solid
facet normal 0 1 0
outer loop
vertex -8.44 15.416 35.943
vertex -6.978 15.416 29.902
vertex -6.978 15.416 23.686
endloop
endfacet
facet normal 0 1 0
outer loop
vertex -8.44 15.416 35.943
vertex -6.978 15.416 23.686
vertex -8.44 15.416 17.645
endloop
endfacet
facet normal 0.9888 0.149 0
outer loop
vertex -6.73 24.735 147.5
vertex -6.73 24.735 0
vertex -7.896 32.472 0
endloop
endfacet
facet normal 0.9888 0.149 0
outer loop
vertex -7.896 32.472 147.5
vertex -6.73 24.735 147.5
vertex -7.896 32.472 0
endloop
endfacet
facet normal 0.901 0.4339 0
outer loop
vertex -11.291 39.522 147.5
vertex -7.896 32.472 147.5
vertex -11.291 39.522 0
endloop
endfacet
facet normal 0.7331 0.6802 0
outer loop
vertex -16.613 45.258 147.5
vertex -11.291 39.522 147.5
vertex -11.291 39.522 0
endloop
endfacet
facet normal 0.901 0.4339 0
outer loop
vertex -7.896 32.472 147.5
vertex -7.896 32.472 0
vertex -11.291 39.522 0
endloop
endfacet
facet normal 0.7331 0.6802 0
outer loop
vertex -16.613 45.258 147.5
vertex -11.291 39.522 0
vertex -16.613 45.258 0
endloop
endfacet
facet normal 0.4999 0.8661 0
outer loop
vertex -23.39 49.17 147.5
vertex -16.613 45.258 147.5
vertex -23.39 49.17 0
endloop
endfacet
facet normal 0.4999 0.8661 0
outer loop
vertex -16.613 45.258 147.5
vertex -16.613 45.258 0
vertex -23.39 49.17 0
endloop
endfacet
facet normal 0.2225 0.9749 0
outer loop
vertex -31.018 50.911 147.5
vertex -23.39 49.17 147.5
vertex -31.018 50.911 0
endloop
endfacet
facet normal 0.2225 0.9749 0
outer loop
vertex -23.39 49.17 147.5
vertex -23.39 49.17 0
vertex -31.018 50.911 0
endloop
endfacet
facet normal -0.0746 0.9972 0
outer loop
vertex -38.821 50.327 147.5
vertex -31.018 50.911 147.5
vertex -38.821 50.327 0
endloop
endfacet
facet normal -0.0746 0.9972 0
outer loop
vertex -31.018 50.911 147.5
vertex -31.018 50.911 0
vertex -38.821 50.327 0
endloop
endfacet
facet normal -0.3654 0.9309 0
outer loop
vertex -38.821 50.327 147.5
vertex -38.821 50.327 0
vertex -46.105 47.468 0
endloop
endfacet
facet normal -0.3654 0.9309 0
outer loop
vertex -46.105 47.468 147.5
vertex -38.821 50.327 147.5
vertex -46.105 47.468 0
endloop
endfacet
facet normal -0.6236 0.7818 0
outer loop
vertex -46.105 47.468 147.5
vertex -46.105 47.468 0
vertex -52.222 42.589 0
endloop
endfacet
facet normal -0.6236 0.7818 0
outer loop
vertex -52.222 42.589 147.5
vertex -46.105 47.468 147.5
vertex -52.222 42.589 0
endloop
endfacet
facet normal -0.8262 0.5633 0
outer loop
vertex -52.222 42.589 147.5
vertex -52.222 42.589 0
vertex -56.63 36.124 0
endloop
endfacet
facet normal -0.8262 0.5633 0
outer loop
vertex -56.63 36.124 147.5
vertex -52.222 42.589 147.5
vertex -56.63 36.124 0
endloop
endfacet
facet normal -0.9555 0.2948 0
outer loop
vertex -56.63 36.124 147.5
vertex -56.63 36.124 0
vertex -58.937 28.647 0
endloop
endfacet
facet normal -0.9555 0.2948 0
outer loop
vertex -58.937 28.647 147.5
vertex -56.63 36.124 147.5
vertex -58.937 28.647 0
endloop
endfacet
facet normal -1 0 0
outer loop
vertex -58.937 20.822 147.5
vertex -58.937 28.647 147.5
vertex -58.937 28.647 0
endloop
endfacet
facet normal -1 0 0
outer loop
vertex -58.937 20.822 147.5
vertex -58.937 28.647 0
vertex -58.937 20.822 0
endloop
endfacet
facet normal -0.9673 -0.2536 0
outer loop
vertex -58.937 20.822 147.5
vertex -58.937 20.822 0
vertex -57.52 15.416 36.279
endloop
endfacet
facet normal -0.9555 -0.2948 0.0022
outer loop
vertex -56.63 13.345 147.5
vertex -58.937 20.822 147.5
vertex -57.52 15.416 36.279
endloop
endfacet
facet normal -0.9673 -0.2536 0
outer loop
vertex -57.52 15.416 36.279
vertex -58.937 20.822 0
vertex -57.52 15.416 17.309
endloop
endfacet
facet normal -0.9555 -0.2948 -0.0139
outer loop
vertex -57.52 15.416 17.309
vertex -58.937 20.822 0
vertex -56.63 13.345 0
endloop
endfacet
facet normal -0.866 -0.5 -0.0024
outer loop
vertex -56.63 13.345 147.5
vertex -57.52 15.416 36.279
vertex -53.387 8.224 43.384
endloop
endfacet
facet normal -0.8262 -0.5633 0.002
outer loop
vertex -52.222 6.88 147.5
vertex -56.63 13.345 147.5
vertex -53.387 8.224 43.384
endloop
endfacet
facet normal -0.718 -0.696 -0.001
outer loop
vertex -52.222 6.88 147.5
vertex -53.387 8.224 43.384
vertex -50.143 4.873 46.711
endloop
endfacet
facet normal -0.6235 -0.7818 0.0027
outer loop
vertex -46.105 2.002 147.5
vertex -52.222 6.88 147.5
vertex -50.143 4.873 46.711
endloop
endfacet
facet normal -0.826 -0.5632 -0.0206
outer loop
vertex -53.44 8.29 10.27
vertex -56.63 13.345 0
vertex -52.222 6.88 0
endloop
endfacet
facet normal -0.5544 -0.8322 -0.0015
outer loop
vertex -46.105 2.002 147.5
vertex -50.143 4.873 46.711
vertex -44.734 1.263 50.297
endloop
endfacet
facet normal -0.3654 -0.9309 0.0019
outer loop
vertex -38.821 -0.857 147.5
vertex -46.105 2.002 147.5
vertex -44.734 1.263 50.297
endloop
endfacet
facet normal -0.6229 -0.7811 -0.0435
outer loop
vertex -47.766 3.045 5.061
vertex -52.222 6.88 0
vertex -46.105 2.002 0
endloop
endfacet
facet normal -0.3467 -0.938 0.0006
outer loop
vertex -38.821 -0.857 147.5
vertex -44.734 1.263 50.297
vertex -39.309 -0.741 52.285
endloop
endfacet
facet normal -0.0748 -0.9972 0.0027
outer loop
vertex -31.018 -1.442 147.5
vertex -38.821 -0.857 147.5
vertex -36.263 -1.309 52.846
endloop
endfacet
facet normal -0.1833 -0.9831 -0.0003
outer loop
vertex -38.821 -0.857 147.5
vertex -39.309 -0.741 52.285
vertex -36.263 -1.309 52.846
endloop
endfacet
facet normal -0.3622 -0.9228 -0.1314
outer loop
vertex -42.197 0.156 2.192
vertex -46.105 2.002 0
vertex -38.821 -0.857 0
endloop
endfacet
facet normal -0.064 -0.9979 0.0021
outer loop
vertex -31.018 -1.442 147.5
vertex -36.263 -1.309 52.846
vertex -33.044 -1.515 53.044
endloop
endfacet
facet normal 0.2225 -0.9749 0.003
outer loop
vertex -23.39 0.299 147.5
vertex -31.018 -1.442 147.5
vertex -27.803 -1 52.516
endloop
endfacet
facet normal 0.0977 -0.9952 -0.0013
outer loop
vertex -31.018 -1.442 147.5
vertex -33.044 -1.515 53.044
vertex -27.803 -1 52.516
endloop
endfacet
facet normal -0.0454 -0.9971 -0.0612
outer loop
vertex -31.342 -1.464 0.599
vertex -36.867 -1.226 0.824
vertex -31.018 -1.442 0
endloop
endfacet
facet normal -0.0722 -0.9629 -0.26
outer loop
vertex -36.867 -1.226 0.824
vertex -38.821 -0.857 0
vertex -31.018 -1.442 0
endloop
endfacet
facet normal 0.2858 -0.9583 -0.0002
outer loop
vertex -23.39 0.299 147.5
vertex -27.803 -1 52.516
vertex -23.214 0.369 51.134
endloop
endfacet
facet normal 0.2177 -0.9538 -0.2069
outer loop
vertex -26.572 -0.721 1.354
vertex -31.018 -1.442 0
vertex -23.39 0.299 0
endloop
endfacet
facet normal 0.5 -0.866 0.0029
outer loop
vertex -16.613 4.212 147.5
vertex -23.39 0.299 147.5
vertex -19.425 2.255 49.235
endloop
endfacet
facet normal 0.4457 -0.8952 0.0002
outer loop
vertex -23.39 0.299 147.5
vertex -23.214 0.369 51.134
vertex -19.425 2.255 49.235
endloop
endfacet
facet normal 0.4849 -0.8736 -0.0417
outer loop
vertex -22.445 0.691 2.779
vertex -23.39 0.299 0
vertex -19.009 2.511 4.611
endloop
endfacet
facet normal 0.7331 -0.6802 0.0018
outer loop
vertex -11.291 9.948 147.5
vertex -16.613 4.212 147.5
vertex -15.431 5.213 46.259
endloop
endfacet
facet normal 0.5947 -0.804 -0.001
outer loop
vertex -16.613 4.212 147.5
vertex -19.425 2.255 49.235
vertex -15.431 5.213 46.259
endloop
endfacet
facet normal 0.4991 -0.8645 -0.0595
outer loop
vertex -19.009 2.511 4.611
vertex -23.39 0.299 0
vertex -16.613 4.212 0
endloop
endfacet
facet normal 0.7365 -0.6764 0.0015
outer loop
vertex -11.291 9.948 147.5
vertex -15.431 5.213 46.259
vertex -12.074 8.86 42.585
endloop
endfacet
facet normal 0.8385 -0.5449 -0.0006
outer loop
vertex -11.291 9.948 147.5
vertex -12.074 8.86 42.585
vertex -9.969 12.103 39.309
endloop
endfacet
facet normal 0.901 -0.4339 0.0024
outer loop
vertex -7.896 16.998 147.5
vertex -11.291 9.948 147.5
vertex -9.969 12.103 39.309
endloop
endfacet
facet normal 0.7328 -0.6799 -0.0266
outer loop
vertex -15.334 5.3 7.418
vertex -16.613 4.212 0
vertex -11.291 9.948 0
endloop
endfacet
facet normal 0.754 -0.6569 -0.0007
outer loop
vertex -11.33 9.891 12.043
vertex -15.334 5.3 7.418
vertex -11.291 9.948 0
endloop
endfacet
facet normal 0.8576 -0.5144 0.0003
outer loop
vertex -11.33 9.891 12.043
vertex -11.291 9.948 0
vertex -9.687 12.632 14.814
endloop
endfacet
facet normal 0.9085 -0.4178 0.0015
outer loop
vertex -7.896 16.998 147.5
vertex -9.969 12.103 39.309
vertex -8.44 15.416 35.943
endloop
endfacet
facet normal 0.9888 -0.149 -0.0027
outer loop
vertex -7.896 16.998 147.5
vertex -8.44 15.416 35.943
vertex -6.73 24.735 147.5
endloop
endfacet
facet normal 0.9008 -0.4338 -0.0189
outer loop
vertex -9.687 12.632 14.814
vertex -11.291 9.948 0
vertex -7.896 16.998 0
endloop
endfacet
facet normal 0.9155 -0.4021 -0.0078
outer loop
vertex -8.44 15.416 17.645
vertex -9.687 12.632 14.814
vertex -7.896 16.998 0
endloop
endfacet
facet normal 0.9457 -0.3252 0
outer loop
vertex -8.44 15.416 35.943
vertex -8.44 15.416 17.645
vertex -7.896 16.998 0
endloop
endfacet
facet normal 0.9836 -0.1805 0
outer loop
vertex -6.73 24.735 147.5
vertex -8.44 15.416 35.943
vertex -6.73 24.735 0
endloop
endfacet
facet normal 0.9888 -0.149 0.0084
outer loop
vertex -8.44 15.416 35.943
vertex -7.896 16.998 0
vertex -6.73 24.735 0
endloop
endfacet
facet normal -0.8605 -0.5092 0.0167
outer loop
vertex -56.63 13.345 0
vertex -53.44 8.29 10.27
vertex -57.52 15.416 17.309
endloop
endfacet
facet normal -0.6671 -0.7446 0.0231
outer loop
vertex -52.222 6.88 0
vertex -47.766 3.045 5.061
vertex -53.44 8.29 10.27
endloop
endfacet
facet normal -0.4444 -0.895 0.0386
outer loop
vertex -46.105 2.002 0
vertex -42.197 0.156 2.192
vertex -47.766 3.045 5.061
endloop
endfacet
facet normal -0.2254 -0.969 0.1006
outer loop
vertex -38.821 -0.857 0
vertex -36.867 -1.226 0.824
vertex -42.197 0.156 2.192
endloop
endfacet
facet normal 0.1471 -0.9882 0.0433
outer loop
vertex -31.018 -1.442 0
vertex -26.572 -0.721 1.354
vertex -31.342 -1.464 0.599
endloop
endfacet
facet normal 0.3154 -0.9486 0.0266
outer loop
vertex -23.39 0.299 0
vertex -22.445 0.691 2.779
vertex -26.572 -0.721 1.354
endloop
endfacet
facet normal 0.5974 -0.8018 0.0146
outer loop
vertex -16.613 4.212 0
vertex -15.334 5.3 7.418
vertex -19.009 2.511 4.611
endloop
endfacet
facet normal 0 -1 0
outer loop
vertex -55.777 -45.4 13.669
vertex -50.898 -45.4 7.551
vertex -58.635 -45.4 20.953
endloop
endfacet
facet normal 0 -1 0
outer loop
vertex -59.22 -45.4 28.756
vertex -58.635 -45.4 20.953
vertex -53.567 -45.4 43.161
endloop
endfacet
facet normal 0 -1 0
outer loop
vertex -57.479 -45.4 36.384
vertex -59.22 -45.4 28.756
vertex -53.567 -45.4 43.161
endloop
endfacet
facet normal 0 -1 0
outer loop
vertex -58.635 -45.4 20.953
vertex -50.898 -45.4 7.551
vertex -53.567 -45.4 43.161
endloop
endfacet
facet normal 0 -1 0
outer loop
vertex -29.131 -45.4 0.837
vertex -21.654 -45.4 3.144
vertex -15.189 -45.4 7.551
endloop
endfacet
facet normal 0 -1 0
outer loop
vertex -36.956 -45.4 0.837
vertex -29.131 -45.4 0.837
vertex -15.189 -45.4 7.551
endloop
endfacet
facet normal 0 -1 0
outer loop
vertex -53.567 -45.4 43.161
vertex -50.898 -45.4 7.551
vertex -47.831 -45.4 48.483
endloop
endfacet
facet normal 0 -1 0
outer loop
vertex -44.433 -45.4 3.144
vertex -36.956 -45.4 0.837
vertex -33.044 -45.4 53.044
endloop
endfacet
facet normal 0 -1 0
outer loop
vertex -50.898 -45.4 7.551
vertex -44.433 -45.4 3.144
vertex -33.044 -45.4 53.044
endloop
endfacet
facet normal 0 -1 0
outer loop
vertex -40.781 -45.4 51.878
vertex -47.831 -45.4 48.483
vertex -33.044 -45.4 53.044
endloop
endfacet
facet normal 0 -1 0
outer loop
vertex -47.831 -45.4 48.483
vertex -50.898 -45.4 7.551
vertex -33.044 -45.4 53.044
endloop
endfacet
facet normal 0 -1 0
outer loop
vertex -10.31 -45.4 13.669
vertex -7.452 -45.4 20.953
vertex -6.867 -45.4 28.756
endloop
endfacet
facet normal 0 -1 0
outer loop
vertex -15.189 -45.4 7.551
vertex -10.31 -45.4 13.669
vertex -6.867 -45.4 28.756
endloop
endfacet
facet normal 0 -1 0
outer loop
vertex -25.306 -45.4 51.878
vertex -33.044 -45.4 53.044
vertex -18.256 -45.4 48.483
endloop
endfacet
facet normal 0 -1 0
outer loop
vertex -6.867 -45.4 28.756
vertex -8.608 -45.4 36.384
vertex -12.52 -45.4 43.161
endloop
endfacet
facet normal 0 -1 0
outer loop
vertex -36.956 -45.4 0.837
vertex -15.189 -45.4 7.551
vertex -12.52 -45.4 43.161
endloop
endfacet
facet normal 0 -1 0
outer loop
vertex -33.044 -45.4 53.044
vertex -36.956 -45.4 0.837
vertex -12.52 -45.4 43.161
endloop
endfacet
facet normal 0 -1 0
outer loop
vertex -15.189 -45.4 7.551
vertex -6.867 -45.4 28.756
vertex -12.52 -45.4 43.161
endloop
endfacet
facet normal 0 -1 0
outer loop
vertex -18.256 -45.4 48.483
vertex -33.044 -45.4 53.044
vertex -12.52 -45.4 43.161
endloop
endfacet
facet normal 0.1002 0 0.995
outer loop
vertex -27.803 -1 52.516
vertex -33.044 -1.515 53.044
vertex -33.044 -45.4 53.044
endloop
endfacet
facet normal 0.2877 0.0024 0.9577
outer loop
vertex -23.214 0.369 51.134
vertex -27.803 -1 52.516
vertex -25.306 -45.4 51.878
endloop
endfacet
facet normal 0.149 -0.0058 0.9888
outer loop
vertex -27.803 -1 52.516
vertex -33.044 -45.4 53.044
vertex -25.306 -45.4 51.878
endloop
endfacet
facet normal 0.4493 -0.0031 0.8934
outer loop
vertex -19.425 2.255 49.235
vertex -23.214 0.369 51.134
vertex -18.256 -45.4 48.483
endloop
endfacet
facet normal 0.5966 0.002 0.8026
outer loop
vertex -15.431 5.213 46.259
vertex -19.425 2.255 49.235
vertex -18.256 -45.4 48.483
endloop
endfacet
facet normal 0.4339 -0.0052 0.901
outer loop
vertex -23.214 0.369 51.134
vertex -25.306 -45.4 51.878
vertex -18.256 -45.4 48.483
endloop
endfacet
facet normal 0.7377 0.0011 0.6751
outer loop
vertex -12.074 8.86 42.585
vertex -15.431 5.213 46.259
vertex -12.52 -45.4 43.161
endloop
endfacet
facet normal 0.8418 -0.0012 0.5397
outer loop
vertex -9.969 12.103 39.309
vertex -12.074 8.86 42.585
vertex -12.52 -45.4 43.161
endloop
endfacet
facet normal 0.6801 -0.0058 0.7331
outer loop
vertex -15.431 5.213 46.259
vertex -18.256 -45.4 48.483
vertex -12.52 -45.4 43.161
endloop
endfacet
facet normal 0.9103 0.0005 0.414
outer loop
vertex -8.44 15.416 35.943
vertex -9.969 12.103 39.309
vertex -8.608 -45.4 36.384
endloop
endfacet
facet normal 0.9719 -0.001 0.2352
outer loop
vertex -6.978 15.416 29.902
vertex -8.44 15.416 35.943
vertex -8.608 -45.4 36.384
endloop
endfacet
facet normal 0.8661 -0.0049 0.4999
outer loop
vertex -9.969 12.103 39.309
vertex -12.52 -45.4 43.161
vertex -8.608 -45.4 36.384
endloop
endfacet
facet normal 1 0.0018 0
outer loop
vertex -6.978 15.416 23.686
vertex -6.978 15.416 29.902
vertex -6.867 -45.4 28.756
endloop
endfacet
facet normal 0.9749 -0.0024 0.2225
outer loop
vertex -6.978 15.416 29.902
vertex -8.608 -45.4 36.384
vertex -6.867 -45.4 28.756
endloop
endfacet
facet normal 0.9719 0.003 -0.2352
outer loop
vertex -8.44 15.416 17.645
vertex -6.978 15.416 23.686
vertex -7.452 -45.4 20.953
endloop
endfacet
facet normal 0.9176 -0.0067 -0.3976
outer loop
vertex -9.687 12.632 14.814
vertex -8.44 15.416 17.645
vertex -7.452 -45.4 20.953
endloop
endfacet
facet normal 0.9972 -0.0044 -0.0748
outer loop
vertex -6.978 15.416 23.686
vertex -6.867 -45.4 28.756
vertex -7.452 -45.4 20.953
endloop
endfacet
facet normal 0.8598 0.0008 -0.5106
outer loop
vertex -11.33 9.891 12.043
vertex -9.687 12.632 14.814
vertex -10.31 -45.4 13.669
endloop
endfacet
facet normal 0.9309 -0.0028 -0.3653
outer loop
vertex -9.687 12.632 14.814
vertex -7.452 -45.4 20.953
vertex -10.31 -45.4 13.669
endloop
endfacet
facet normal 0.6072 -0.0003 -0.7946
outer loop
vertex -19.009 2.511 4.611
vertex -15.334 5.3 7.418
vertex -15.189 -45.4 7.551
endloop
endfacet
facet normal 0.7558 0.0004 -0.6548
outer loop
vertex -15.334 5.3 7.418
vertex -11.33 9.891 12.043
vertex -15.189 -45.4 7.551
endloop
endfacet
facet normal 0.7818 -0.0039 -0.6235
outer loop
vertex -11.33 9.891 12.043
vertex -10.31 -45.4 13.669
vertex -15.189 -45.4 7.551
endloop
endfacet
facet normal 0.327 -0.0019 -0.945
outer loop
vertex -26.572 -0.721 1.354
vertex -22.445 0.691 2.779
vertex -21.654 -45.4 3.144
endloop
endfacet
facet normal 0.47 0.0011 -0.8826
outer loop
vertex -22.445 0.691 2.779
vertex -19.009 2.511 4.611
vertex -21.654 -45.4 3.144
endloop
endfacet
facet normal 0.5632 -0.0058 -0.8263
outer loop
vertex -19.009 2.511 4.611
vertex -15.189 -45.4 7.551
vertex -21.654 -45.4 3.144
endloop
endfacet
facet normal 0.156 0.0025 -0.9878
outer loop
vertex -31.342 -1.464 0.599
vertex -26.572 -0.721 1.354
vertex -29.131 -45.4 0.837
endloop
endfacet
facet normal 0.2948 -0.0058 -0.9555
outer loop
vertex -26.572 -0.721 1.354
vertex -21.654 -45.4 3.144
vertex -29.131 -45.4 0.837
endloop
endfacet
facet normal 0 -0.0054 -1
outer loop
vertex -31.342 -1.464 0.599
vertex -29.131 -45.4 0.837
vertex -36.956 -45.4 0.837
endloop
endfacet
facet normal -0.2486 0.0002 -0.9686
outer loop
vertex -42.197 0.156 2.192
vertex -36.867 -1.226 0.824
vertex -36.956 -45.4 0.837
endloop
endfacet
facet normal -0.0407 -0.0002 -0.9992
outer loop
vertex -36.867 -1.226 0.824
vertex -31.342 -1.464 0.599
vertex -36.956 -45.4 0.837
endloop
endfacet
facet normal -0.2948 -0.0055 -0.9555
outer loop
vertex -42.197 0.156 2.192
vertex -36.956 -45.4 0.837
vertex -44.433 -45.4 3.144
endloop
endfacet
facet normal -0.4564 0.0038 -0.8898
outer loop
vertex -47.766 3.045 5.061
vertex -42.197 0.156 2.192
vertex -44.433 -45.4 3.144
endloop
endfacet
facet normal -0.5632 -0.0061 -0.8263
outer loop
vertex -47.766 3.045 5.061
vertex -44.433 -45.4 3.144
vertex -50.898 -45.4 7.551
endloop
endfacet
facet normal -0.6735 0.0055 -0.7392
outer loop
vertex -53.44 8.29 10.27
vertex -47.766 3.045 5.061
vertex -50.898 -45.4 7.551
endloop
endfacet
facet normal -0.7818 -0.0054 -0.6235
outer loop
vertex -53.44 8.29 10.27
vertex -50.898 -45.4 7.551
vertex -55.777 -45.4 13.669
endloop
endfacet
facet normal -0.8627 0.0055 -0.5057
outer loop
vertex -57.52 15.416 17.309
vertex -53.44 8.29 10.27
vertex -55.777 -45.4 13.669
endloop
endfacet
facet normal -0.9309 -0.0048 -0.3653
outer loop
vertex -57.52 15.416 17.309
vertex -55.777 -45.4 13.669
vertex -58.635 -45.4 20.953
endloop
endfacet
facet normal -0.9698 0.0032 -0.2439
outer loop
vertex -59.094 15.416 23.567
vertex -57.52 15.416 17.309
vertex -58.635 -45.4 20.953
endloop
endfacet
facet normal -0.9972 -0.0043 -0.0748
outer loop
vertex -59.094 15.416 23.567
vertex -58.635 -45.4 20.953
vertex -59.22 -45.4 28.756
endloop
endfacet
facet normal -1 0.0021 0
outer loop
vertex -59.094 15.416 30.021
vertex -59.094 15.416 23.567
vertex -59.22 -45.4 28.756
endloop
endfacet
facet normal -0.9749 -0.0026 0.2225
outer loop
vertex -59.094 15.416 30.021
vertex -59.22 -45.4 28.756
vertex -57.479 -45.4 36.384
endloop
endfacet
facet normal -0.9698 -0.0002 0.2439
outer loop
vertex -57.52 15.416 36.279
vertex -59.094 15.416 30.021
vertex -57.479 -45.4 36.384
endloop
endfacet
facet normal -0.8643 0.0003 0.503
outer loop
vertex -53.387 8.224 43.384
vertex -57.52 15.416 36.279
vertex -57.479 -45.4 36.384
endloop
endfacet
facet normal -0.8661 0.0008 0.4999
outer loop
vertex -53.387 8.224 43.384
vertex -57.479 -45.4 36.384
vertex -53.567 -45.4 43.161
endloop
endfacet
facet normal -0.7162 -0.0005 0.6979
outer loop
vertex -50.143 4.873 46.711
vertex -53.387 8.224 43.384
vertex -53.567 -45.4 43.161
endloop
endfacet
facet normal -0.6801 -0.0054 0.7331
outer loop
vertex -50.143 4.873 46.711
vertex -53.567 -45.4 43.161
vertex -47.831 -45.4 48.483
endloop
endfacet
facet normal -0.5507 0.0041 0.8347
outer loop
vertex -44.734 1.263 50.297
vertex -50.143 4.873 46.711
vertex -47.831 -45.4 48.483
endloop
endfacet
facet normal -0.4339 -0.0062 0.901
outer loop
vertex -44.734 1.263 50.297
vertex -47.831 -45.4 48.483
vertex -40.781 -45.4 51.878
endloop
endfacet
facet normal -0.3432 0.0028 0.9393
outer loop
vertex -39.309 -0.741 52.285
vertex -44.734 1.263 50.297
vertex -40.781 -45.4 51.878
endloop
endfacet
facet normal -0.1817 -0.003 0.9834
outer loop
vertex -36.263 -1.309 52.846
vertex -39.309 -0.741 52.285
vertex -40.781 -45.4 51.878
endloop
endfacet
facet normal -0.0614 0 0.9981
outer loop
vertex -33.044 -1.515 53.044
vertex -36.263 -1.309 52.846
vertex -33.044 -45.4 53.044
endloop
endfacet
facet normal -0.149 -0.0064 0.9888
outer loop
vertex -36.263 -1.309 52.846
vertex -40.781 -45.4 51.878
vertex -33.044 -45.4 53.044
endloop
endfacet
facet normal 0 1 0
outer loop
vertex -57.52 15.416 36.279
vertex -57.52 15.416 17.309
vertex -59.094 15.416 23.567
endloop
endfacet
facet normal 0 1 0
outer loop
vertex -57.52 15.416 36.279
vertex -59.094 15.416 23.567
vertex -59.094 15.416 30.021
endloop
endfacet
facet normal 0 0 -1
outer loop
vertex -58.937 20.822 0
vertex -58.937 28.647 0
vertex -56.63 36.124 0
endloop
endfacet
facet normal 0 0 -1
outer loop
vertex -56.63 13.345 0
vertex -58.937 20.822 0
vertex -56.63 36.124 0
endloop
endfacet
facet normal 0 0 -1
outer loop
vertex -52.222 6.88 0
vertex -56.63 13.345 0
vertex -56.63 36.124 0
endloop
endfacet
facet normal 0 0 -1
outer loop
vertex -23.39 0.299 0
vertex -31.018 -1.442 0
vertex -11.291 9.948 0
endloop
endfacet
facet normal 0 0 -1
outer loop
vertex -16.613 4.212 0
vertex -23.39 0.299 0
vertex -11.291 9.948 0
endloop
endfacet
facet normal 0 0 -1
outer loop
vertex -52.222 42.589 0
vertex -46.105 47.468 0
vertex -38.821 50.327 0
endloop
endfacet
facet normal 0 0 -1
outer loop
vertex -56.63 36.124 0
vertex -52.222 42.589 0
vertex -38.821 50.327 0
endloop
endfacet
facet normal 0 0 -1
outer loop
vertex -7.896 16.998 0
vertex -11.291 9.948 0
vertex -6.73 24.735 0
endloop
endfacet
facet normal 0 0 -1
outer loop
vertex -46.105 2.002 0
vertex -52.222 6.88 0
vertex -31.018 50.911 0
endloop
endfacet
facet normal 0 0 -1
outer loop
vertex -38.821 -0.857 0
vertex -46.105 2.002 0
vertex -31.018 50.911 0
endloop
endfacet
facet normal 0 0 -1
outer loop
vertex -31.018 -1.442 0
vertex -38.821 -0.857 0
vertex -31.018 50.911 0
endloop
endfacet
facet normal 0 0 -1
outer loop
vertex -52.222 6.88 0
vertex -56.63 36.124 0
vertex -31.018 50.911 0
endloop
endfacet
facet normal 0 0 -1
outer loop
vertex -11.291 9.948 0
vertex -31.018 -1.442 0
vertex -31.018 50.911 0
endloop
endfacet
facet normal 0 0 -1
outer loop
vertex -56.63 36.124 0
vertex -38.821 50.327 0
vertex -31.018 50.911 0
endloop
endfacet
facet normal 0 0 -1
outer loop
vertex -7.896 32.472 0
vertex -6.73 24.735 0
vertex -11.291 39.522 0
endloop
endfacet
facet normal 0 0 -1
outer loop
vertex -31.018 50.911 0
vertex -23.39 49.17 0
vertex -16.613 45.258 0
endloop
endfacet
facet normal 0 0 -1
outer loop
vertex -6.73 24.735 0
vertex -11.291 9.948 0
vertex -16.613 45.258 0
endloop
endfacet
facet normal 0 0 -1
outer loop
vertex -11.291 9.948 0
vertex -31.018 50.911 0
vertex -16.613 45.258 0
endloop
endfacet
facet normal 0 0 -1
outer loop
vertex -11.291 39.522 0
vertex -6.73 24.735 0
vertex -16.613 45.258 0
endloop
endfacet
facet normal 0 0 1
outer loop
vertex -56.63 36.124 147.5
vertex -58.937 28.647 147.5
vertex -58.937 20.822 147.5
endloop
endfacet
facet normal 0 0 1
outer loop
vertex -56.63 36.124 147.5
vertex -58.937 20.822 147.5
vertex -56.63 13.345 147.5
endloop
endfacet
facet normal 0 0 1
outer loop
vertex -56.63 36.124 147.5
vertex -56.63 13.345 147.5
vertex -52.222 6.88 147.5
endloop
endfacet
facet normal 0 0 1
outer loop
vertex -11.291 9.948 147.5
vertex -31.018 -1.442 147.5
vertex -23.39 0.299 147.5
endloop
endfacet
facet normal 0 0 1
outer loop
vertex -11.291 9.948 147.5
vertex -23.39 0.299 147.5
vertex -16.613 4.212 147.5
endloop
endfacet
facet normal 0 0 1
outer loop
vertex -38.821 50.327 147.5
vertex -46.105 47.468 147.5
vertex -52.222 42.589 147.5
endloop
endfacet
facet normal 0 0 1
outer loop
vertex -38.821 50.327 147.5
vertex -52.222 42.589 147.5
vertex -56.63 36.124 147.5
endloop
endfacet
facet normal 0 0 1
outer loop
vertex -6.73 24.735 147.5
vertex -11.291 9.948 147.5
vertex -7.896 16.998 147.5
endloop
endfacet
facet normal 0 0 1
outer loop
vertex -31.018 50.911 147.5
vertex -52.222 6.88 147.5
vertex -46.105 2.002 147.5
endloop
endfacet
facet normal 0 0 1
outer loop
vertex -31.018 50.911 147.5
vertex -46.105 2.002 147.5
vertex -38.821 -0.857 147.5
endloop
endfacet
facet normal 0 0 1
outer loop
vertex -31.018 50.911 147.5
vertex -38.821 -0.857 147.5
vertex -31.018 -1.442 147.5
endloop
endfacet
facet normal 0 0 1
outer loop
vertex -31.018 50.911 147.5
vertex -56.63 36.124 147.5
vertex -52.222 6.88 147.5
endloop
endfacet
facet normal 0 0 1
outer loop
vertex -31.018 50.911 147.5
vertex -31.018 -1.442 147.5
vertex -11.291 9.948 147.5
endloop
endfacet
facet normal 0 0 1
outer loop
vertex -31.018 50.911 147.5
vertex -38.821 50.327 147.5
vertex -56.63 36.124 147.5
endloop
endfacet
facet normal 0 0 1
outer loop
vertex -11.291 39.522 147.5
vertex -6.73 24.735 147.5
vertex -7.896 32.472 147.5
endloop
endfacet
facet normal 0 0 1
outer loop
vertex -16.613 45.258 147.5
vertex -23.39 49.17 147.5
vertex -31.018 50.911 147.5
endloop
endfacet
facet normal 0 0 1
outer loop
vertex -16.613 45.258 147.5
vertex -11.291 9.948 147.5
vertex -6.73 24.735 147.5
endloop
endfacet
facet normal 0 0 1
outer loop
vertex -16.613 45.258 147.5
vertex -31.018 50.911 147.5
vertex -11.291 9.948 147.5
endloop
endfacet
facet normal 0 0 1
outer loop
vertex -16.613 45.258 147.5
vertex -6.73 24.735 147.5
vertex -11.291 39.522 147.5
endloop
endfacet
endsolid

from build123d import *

# Parameters (mm, degrees)
SKETCH2_R                = 26.25
BOSS_EXTRUDE2_DEPTH      = 147.5
BOSS_EXTRUDE4_DEPTH      = 15.416
BOSS_EXTRUDE4_DEPTH_BACK = 45.4
SKETCH3_R                = 26.25


with BuildPart() as part:
    # Sketch2 → Boss-Extrude2 (new body)
    with BuildSketch(Plane.XY):
        with Locations((-32.979772941, 24.734829706)):
            Circle(SKETCH2_R)
    extrude(amount=BOSS_EXTRUDE2_DEPTH)

    # Sketch3 → Boss-Extrude4 (add, two sides: drawn at the far end of the back side and taken through both)
    with BuildSketch(Plane(origin=(0, 0, 0), x_dir=(1, 0, 0), z_dir=(0, 1, 0)).offset(-BOSS_EXTRUDE4_DEPTH_BACK)):
        with Locations(Location((-33.04352384, -26.794047718, 0), (0, 0, 270))):
            Circle(SKETCH3_R)
    extrude(amount=BOSS_EXTRUDE4_DEPTH + BOSS_EXTRUDE4_DEPTH_BACK)


solid = part.part
